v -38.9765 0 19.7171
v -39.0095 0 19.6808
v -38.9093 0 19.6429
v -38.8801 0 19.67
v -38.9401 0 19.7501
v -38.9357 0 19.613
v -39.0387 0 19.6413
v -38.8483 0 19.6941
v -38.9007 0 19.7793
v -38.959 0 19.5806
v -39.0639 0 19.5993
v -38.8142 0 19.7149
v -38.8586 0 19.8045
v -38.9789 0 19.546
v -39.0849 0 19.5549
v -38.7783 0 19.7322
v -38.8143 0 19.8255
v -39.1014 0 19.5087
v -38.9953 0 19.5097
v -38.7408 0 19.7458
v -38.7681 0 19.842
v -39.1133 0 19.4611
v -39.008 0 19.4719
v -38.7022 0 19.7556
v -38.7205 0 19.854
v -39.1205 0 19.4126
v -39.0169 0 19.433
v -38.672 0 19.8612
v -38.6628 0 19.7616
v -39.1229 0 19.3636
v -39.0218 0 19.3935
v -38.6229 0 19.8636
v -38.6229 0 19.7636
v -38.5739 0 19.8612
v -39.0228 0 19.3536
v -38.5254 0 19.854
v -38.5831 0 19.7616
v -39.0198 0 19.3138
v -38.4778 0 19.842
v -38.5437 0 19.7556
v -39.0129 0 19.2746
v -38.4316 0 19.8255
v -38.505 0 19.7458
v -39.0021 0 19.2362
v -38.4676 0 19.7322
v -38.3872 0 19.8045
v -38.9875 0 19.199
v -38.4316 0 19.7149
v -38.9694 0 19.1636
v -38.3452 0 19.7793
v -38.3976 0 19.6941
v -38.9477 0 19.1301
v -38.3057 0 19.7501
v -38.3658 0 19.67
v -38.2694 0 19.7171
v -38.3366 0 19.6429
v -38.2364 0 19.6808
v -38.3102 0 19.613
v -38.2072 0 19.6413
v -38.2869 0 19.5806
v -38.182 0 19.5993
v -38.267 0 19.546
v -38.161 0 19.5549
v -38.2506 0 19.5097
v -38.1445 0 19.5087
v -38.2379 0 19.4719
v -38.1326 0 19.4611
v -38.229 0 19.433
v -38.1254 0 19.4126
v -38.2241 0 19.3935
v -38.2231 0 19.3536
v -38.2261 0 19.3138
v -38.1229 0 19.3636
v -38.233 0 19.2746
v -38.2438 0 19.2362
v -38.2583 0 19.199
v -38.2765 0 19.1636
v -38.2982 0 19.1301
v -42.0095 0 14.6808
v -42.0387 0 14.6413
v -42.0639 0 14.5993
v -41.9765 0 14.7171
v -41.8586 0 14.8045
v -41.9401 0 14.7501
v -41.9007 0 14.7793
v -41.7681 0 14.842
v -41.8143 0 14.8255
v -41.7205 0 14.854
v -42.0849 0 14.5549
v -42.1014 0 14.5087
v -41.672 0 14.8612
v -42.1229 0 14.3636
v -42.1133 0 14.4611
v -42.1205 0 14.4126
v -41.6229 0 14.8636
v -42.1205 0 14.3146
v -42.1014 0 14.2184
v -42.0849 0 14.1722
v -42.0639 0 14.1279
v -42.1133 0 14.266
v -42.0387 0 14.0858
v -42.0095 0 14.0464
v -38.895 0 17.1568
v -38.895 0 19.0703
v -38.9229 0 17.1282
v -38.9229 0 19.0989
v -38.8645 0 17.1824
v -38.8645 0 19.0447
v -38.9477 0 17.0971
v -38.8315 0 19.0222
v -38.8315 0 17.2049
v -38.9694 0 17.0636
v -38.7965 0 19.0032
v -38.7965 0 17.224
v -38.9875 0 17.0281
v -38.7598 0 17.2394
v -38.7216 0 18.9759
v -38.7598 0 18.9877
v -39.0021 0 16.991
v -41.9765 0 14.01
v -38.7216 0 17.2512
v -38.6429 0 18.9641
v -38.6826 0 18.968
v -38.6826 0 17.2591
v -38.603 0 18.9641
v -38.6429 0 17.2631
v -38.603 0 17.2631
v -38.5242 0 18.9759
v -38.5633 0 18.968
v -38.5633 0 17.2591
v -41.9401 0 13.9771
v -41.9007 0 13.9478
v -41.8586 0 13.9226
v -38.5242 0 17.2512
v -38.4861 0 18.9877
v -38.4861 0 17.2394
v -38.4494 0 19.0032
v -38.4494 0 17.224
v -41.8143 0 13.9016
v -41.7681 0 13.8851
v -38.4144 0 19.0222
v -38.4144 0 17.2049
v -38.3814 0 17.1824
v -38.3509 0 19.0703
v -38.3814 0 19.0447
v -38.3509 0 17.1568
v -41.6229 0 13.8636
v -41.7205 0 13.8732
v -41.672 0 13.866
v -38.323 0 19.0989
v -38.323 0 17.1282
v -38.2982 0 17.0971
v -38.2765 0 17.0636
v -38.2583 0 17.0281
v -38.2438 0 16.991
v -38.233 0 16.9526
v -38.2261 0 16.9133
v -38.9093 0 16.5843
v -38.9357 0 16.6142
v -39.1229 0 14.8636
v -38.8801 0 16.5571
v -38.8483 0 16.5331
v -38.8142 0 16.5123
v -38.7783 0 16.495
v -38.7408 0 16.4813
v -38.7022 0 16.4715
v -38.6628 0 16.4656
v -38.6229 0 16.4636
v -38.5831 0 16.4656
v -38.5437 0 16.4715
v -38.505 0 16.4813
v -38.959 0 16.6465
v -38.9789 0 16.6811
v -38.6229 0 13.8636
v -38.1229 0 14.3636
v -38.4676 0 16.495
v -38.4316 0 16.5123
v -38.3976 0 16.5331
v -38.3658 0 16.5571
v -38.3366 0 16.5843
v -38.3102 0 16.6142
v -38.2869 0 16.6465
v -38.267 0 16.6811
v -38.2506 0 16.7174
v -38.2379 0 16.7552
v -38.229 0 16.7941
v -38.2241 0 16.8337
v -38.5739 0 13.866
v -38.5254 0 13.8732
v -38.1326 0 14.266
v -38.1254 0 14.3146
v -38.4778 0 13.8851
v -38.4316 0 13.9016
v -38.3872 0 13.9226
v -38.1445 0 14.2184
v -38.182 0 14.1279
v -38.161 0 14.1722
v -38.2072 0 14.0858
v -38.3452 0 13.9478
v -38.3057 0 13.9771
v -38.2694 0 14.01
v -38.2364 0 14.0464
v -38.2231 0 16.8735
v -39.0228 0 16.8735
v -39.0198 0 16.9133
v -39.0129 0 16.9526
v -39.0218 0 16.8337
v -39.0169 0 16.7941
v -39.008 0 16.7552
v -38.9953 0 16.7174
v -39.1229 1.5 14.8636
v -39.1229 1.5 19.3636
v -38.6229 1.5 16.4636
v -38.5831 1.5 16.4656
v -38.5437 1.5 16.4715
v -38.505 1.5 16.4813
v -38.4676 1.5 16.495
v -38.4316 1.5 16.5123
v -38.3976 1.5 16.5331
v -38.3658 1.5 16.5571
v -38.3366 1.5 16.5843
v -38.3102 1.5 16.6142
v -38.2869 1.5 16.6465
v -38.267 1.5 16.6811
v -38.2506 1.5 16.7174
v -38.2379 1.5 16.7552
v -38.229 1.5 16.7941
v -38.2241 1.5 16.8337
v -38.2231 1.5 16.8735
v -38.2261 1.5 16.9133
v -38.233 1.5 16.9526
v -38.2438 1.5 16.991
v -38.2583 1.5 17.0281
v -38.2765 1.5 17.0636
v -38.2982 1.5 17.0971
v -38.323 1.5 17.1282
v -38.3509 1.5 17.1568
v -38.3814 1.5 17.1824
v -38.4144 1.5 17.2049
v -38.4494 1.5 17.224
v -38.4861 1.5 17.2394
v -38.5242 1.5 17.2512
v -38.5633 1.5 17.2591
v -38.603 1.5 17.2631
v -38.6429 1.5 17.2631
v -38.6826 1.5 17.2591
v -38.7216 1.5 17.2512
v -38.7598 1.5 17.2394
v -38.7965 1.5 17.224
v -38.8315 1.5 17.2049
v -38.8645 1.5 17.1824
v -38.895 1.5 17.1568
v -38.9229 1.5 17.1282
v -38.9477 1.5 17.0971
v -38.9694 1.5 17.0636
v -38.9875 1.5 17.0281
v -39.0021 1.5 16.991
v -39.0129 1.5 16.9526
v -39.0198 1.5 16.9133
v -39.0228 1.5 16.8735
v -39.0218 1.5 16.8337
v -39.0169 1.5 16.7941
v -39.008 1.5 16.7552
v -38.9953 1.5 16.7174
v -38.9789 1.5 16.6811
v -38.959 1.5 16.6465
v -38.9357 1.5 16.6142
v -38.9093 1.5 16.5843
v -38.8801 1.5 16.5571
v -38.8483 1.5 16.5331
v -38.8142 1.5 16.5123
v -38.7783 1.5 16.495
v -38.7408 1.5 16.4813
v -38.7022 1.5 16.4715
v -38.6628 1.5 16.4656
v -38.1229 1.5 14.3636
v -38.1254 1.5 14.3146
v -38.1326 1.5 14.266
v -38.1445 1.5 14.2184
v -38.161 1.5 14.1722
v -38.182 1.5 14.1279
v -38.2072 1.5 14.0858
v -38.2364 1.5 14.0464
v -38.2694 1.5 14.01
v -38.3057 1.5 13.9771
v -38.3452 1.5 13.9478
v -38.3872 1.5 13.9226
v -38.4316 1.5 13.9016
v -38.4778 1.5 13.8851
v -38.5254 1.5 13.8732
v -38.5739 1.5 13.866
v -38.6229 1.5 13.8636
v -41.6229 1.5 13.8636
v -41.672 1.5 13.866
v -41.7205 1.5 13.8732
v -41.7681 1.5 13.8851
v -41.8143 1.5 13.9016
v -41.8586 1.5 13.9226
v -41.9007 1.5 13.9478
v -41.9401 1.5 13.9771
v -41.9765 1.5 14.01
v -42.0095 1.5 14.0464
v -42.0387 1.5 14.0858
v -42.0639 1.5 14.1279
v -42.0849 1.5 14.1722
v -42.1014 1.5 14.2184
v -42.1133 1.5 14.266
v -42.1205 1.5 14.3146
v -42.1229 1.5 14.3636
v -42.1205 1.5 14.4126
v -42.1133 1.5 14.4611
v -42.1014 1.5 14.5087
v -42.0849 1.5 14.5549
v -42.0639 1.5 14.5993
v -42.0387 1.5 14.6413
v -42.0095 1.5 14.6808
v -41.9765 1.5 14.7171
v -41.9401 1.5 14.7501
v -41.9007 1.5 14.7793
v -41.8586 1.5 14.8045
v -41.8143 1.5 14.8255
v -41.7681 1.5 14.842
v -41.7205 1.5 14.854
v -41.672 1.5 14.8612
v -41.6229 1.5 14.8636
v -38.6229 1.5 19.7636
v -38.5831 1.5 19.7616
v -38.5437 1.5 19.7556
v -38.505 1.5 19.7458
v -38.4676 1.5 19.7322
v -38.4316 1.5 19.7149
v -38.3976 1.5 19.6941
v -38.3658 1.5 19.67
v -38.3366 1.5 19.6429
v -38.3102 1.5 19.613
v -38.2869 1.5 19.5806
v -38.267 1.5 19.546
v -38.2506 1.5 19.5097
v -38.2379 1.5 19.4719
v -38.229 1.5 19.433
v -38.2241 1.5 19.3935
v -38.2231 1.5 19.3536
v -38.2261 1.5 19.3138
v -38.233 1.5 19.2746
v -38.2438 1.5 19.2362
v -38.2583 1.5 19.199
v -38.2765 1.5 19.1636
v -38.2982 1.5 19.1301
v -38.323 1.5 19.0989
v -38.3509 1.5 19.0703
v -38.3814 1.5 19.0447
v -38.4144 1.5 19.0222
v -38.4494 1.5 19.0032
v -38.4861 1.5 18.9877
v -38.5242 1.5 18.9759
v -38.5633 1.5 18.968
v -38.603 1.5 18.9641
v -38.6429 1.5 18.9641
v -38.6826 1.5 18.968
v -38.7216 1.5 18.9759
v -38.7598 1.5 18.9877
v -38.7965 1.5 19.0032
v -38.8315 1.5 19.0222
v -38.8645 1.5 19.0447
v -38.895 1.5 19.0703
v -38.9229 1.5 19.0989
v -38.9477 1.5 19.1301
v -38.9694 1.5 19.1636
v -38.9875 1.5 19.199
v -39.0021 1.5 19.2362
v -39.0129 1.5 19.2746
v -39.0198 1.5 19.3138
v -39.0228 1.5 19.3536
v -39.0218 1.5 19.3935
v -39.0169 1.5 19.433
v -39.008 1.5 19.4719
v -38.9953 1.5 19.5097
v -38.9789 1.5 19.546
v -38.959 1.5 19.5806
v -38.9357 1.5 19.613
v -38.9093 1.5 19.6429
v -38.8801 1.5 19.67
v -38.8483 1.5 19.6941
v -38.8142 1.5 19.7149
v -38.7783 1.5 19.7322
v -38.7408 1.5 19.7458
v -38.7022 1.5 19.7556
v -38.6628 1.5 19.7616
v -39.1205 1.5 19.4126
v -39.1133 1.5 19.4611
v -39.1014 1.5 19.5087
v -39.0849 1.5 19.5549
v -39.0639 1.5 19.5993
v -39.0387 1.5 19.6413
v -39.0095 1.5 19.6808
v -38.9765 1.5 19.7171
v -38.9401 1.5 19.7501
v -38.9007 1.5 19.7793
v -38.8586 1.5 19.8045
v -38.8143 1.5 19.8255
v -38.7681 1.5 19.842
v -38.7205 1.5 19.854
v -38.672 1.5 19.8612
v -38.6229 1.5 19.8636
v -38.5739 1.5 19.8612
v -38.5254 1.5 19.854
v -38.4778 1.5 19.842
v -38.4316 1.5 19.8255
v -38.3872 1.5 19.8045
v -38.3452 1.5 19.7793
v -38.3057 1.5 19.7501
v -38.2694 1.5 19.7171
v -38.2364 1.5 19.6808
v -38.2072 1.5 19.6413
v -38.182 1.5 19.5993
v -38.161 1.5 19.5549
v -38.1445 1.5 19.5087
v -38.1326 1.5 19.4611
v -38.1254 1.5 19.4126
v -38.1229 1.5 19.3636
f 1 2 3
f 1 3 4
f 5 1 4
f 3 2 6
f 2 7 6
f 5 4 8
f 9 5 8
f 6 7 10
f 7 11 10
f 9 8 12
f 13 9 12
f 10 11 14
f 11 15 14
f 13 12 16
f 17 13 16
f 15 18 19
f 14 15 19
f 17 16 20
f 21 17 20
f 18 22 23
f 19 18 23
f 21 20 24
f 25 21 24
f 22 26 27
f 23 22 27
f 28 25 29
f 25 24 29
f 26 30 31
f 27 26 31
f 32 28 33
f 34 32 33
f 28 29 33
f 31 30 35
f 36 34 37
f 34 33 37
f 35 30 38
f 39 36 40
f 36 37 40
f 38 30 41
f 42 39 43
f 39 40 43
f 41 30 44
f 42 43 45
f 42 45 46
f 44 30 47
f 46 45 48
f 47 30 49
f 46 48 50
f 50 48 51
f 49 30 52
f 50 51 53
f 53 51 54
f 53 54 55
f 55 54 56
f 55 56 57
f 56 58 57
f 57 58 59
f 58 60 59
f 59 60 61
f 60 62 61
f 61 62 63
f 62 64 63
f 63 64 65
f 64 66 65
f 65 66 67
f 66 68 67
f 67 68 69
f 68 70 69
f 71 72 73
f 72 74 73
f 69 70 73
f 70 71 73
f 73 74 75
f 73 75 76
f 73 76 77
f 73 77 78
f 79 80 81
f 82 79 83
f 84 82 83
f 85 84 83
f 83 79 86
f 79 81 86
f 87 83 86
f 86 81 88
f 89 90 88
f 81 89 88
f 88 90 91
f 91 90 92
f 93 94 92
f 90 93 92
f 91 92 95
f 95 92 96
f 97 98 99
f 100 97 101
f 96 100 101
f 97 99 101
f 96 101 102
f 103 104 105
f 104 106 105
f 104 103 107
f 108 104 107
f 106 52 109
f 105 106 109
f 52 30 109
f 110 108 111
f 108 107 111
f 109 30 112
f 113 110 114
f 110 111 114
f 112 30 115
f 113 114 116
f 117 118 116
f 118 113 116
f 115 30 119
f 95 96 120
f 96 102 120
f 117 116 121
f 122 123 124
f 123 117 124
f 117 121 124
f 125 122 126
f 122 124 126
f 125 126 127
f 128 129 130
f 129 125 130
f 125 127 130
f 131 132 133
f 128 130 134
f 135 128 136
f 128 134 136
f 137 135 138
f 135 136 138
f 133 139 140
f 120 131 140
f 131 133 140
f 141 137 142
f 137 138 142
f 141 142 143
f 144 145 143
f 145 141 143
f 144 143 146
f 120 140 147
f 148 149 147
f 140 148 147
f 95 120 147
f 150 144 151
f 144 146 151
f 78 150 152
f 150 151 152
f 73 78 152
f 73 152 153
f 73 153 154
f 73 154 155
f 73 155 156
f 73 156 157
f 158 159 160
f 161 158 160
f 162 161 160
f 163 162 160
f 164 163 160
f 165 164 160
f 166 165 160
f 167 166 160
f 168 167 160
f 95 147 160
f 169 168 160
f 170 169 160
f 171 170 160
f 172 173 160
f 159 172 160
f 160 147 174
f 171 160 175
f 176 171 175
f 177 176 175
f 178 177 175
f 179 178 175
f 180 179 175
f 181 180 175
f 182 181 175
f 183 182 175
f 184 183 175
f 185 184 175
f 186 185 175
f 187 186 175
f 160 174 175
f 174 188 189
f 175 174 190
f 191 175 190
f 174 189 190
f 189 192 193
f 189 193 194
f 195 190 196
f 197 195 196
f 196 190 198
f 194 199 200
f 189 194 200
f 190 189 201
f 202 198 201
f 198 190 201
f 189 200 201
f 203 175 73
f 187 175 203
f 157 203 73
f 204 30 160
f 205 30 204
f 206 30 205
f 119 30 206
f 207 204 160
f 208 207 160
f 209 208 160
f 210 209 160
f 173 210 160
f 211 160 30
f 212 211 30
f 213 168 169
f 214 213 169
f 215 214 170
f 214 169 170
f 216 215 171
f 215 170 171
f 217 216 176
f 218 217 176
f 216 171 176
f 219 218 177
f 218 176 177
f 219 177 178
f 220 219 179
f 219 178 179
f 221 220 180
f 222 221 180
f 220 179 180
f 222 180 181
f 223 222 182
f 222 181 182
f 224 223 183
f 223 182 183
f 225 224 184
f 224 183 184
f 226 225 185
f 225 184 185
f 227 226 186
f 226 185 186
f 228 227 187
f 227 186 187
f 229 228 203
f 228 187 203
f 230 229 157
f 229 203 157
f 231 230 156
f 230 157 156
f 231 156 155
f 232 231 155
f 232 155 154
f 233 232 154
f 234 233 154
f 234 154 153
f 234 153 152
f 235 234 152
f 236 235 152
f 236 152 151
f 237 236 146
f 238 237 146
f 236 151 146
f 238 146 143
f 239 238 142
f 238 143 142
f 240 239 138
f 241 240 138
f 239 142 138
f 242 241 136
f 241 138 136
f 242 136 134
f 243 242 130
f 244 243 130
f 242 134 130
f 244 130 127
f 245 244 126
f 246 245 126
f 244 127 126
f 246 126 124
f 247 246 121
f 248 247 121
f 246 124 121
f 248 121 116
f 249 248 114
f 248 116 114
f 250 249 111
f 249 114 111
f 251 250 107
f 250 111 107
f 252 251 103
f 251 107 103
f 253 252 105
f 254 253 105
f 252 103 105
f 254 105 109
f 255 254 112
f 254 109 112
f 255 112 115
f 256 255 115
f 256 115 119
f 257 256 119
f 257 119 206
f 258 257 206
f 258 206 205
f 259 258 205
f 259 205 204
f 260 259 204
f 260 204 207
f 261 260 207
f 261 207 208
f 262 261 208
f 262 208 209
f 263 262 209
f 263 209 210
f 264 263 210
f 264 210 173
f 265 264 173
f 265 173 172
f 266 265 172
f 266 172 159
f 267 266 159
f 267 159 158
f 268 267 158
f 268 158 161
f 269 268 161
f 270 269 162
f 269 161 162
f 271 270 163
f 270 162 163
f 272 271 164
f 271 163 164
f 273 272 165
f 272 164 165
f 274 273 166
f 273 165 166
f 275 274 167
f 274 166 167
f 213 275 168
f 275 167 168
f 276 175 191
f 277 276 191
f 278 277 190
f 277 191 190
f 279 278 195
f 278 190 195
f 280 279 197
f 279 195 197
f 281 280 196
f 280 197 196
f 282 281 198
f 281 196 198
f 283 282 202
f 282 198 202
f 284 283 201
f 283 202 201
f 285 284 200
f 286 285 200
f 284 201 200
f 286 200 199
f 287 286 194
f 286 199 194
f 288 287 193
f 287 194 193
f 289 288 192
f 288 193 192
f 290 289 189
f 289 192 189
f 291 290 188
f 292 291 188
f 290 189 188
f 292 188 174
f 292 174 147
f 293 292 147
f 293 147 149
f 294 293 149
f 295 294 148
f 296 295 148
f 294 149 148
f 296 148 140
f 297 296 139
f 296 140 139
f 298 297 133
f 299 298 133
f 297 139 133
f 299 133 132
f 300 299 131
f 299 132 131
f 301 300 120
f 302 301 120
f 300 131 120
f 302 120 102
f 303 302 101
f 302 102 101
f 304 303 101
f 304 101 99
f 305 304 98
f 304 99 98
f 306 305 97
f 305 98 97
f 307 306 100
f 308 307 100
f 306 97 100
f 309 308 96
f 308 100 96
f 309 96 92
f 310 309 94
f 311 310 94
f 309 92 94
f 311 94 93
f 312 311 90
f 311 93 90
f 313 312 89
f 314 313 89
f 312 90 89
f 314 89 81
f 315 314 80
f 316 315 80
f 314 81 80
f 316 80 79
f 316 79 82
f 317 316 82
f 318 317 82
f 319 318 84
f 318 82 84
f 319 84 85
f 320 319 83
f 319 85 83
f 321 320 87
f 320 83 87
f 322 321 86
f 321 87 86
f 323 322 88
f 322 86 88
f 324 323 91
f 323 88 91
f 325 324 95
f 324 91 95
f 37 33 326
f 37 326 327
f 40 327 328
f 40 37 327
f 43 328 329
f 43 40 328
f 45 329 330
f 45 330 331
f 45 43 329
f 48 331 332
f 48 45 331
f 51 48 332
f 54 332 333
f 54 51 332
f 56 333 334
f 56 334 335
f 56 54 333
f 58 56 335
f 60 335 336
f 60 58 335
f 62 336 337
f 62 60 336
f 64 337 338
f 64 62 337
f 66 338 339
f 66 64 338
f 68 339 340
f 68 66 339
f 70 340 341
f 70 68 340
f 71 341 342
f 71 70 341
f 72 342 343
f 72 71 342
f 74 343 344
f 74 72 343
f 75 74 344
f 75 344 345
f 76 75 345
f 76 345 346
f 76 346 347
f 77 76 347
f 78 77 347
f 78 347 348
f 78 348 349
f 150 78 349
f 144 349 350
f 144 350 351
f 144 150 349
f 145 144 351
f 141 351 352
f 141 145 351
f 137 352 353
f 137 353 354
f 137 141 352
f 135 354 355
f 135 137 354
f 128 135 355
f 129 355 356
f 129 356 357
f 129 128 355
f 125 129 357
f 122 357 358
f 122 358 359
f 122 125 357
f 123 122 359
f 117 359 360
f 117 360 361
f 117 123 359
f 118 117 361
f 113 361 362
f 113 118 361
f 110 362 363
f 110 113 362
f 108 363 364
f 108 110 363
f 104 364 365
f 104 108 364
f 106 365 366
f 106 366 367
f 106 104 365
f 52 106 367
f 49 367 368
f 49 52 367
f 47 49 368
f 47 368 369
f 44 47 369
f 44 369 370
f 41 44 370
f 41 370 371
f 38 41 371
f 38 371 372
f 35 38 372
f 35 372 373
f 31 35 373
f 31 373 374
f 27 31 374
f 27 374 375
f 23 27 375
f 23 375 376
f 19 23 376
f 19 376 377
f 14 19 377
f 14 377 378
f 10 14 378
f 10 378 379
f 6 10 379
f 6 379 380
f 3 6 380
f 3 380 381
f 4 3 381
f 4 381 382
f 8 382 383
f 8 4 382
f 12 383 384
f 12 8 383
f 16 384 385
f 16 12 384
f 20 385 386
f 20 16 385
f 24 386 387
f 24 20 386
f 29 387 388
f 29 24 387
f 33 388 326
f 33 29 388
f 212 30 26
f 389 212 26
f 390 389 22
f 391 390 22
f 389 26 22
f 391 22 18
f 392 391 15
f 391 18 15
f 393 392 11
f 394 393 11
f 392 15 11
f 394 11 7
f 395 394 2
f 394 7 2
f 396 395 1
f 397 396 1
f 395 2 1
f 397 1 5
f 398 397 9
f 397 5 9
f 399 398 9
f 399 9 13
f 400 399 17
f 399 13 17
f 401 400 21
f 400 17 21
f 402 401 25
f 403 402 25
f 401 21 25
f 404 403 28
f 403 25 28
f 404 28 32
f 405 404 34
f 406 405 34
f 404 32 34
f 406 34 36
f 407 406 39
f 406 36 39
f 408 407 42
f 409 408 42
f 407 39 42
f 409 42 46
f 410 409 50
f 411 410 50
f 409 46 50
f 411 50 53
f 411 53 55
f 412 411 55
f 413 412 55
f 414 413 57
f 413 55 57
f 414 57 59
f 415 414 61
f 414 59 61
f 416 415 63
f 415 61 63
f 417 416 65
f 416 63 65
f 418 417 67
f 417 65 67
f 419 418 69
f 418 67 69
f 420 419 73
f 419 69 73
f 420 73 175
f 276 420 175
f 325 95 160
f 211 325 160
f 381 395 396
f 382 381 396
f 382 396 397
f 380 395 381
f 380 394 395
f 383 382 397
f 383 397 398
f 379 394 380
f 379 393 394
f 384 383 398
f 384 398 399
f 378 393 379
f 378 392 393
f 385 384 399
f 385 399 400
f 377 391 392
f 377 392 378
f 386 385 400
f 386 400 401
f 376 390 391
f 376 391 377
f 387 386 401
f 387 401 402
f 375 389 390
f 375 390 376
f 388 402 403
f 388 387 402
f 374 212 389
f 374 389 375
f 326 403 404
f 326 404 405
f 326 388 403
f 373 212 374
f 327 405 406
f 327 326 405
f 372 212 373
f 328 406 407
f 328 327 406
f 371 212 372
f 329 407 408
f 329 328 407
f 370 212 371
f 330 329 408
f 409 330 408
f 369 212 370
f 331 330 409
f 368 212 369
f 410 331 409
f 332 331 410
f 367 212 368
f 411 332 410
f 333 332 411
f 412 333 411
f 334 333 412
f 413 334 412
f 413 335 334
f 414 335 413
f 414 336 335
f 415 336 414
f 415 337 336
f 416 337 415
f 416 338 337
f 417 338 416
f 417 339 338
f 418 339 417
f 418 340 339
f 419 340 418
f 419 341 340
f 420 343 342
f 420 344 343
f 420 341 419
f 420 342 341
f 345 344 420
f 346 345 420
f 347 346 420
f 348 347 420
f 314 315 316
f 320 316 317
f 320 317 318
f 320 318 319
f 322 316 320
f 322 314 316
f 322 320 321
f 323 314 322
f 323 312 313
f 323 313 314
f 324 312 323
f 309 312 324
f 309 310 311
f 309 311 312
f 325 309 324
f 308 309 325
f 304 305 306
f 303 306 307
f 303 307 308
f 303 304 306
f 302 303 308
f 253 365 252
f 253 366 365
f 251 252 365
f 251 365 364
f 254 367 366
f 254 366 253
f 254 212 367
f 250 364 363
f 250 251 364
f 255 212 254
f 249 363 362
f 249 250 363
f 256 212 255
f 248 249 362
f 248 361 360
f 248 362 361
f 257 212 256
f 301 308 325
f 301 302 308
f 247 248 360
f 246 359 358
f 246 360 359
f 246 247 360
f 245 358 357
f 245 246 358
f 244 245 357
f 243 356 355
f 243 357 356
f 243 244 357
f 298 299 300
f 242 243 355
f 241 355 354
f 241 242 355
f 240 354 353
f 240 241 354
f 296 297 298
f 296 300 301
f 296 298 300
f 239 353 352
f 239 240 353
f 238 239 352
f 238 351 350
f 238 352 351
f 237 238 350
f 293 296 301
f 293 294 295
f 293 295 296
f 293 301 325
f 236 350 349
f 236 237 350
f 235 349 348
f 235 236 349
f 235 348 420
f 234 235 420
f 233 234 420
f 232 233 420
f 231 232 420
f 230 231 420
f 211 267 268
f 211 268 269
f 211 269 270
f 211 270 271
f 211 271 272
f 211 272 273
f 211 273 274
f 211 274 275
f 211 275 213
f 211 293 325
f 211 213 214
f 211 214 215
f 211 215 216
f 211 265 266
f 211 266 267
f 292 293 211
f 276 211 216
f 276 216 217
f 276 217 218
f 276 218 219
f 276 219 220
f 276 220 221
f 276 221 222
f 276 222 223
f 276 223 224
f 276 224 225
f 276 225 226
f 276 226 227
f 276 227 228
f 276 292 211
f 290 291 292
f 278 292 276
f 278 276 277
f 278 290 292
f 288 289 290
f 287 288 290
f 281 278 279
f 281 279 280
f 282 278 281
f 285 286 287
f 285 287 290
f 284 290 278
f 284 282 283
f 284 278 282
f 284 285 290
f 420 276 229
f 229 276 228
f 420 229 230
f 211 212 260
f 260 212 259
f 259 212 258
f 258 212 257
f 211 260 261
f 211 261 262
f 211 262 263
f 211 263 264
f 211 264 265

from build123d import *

# Parameters (mm, degrees)
SKETCH1_R           = 0.4
BOSS_EXTRUDE1_DEPTH = 1.5


with BuildPart() as part:
    # Sketch1 → Boss-Extrude1 (new body)
    with BuildSketch(Plane(origin=(0, 0, 0), x_dir=(1, 0, 0), z_dir=(0, 1, 0))):
        with BuildLine():
            Line((-38.122946219, -19.363563947), (-38.122946219, -14.363563947))
            ThreePointArc((-38.122946219, -14.363563947), (-38.269392829, -14.010010556), (-38.622946219, -13.863563947))
            Line((-38.622946219, -13.863563947), (-41.622946219, -13.863563947))
            ThreePointArc((-41.622946219, -13.863563947), (-42.122946219, -14.363563947), (-41.622946219, -14.863563947))
            Line((-41.622946219, -14.863563947), (-39.122946219, -14.863563947))
            Line((-39.122946219, -14.863563947), (-39.122946219, -19.363563947))
            ThreePointArc((-39.122946219, -19.363563947), (-38.622946219, -19.863563947), (-38.122946219, -19.363563947))
        make_face()
        with Locations(Location((-38.622946219, -19.363563947, 0), (0, 0, 270))):
            Circle(SKETCH1_R, mode=Mode.SUBTRACT)
        with BuildLine():
            ThreePointArc((-38.622946219, -17.263563947), (-39.022946219, -16.863563947), (-38.622946219, -16.463563947))
            ThreePointArc((-38.622946219, -16.463563947), (-38.222946219, -16.863563947), (-38.622946219, -17.263563947))
        make_face(mode=Mode.SUBTRACT)
    extrude(amount=BOSS_EXTRUDE1_DEPTH)


solid = part.part
